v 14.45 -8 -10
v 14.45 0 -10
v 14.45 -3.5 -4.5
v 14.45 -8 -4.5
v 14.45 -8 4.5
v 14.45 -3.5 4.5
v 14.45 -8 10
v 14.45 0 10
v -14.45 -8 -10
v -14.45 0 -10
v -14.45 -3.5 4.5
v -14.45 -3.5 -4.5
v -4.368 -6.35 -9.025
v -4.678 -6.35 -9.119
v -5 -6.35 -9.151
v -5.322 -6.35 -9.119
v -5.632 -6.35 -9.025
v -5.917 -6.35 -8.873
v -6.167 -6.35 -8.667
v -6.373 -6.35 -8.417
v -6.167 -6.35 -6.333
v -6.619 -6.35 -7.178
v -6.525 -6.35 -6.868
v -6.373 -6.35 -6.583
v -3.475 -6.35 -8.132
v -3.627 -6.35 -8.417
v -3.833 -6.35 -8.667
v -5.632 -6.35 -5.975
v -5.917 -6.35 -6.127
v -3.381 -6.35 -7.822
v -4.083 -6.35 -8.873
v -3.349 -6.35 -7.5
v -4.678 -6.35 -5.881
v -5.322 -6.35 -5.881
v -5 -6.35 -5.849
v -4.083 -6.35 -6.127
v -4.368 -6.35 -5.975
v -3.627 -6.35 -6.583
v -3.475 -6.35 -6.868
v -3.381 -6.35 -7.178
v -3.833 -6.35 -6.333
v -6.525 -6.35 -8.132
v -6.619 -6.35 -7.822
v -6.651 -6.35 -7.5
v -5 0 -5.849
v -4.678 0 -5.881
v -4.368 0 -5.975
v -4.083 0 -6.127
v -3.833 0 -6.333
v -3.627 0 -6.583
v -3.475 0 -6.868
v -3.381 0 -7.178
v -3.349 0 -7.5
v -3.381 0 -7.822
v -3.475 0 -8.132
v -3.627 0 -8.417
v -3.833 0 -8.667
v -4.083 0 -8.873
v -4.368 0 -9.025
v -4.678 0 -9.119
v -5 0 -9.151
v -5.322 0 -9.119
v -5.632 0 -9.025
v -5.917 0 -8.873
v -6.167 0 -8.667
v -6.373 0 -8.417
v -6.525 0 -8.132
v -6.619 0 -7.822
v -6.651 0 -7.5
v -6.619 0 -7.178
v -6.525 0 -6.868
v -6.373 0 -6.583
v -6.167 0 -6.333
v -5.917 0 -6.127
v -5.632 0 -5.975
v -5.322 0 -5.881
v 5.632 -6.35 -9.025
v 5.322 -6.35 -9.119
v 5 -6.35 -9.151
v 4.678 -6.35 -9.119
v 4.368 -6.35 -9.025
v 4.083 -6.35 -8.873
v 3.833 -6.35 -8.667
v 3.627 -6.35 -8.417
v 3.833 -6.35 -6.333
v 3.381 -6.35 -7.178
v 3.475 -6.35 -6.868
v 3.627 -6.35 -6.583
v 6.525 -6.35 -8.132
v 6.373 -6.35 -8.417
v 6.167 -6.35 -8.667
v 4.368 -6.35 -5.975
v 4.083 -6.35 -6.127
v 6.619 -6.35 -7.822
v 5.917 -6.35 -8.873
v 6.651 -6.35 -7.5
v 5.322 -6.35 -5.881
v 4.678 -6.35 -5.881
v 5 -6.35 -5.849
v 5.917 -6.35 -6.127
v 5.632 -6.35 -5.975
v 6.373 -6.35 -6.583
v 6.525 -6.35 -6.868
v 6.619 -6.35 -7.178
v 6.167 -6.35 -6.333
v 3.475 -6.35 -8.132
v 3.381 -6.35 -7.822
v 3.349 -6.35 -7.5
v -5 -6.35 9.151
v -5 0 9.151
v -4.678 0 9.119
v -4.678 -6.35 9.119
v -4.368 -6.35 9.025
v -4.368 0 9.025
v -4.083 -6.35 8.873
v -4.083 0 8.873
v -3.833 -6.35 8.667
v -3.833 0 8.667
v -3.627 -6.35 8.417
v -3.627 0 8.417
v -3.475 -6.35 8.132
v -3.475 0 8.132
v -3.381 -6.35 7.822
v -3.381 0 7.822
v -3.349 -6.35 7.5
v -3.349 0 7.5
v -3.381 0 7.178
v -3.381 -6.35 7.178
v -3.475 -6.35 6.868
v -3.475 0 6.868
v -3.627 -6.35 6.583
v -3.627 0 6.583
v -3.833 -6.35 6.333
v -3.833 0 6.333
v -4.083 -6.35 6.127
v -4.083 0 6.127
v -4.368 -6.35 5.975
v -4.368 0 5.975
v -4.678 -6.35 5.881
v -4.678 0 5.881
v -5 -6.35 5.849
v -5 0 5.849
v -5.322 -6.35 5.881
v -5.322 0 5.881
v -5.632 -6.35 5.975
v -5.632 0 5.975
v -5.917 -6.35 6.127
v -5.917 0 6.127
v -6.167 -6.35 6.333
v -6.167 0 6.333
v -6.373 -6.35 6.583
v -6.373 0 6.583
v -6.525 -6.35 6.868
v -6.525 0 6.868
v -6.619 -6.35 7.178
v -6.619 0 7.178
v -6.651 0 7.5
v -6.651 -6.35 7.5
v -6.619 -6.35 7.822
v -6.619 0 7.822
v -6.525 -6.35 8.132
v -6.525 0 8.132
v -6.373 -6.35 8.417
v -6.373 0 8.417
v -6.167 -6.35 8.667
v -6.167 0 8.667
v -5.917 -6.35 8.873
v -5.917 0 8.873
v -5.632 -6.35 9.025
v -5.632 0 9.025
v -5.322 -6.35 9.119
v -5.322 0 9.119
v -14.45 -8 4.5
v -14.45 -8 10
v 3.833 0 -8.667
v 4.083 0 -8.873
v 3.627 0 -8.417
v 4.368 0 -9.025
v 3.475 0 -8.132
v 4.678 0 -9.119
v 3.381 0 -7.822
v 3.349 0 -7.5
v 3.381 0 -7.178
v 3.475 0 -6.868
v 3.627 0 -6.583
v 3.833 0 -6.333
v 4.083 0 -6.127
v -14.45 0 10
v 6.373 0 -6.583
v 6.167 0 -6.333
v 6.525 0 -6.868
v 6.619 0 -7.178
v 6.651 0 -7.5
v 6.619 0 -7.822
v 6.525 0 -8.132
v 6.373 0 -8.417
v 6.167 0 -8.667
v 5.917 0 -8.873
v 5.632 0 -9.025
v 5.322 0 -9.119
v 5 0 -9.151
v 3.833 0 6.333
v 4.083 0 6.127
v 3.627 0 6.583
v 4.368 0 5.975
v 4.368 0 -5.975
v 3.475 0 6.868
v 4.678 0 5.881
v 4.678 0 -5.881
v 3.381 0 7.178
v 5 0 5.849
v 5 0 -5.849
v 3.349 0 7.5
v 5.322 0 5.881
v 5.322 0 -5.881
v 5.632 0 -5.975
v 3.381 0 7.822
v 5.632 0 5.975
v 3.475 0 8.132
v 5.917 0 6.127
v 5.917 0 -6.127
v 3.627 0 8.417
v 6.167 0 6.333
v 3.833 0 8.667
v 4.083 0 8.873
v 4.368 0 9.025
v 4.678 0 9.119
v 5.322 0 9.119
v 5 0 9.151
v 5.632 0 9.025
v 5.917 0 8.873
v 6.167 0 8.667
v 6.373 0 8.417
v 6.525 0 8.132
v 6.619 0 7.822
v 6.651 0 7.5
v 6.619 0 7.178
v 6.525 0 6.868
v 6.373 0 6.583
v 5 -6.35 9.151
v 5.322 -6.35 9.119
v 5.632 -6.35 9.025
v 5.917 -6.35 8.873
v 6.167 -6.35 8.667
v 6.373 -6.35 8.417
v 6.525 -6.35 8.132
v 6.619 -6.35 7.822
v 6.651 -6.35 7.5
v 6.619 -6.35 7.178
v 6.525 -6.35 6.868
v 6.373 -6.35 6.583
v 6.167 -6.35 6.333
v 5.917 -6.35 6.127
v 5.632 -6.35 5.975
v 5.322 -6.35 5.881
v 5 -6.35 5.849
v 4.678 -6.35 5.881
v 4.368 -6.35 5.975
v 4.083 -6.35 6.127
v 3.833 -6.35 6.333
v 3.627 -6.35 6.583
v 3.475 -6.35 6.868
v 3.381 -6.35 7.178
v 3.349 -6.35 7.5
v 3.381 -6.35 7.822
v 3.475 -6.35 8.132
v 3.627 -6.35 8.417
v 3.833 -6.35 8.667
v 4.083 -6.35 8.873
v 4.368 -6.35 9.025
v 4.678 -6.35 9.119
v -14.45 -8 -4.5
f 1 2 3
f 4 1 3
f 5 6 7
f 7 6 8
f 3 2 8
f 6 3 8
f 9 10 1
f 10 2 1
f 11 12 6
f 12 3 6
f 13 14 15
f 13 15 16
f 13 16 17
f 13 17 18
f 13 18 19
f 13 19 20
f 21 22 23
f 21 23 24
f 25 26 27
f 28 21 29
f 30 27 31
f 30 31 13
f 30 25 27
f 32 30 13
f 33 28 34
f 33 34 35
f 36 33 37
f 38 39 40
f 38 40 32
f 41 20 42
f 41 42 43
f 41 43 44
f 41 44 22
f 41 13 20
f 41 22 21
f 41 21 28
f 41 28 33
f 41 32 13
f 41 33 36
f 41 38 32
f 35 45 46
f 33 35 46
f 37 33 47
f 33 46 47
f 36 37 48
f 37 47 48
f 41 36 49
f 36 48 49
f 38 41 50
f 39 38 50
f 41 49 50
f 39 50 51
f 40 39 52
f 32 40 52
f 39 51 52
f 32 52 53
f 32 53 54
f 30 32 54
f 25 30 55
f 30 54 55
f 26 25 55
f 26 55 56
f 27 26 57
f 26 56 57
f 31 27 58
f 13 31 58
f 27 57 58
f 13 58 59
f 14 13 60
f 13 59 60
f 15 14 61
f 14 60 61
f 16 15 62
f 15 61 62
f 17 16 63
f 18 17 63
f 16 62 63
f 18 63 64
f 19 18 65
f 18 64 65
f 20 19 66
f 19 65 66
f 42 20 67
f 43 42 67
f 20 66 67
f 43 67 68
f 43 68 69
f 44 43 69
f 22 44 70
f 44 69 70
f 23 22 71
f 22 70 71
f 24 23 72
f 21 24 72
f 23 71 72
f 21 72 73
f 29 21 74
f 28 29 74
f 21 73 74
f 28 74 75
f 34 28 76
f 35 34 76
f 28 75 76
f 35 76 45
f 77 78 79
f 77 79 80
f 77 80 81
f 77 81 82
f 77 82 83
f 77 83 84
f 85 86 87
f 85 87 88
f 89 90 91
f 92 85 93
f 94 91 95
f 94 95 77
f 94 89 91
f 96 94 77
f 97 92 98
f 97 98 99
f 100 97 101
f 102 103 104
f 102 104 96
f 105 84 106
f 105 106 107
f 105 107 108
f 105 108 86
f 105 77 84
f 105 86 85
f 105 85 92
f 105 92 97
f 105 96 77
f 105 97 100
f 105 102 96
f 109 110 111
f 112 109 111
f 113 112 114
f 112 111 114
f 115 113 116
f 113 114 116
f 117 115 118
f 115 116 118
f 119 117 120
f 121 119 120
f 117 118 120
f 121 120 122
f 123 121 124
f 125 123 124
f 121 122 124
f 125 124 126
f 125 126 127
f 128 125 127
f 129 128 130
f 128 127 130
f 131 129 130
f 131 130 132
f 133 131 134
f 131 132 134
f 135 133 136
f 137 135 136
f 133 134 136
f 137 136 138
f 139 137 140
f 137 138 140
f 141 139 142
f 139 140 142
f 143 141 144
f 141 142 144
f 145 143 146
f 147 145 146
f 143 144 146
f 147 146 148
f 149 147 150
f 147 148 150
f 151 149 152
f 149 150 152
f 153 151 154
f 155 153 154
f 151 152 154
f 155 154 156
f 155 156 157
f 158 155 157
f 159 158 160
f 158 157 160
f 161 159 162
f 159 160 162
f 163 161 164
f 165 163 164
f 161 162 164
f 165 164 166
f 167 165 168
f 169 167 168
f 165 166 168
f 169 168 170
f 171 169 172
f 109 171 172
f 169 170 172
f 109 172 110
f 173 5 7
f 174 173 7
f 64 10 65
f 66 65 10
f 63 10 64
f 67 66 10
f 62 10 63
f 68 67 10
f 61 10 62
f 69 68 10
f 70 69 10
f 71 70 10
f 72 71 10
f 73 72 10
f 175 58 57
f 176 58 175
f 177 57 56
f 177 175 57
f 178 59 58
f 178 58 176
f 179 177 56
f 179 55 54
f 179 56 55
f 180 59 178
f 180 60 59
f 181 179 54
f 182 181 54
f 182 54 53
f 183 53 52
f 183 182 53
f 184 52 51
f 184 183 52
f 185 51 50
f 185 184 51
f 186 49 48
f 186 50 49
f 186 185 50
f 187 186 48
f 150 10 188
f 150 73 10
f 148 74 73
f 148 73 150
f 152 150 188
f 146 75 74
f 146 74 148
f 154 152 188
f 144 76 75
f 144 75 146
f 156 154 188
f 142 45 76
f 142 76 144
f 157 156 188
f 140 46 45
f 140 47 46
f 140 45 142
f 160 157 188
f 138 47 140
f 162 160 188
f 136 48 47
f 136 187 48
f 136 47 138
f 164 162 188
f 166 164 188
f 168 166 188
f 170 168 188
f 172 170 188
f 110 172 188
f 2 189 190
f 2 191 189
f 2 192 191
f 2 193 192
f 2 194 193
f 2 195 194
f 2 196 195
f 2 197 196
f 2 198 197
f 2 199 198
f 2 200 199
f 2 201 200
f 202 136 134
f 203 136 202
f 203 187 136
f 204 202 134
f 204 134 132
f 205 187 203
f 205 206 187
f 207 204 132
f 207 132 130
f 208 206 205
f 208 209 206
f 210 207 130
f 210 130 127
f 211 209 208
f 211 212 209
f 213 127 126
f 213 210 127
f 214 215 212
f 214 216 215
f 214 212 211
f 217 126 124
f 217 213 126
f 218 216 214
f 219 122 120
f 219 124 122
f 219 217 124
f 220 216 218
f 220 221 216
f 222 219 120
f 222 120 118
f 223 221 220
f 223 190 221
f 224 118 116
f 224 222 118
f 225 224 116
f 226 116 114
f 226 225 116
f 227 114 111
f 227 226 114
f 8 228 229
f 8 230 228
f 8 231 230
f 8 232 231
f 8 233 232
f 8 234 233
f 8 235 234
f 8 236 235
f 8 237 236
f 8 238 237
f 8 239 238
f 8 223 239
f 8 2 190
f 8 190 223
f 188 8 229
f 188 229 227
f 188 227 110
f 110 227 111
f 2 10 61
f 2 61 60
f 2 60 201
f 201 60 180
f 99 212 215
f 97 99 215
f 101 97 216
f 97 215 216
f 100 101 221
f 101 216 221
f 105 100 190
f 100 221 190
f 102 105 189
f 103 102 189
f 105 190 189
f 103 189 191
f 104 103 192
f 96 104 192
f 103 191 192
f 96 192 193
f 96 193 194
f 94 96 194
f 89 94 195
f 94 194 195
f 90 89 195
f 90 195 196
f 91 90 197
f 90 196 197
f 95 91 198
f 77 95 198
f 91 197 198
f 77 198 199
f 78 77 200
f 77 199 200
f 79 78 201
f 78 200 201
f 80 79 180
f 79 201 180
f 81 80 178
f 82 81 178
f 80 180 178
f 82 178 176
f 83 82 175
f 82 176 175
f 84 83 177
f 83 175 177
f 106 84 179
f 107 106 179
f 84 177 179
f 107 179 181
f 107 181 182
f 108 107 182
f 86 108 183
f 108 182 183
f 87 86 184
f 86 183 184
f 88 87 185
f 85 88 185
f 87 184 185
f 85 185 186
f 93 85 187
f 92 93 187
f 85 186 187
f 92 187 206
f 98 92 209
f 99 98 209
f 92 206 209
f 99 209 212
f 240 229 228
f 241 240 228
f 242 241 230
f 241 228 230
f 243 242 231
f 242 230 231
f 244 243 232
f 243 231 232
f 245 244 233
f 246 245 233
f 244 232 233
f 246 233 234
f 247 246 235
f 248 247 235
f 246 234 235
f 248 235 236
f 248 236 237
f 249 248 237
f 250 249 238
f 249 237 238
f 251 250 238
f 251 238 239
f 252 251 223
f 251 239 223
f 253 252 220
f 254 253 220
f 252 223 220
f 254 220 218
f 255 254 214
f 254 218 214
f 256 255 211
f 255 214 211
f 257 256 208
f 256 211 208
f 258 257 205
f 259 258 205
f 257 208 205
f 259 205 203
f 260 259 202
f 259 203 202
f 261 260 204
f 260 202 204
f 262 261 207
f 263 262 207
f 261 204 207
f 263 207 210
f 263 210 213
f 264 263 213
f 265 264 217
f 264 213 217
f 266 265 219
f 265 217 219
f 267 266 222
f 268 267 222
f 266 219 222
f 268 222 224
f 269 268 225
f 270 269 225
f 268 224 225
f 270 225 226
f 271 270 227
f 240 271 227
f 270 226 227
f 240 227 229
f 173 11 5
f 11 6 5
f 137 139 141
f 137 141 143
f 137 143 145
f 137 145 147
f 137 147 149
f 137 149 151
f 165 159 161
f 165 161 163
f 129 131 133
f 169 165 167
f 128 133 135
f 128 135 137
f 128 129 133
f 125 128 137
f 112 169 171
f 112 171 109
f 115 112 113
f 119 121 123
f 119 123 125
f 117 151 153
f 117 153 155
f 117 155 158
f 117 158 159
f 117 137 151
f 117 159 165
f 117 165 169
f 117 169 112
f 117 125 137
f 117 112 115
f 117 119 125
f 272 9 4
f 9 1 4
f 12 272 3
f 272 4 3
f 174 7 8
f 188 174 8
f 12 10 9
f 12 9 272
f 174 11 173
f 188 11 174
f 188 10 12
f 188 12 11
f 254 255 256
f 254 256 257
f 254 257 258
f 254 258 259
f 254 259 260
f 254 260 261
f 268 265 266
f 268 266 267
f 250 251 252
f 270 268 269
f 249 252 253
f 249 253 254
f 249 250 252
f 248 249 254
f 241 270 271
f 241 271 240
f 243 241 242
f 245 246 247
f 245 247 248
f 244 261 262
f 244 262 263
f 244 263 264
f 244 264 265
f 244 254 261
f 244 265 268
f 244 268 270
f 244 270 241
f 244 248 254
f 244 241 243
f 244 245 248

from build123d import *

# Parameters (mm, degrees)
BOSS_EXTRUDE1_DEPTH = 14.45
SKETCH2_R           = 1.651
CUT_EXTRUDE1_DEPTH  = 6.35


with BuildPart() as part:
    # Sketch1 → Boss-Extrude1 (new, symmetric)
    with BuildSketch(Plane(origin=(0, 0, 0), x_dir=(0, 0, -1), z_dir=(1, 0, 0))):
        Polygon((0, 0), (10, 0), (10, -8), (4.5, -8), (4.5, -3.5), (-4.5, -3.5), (-4.5, -8), (-10, -8), (-10, 0), align=None)
    extrude(amount=BOSS_EXTRUDE1_DEPTH, both=True)

    # Sketch2 → Cut-Extrude1 (cut)
    with BuildSketch(Plane(origin=(0, 0, 0), x_dir=(1, 0, 0), z_dir=(0, 1, 0))):
        with Locations(Location((5, 7.5, 0), (0, 0, 270))):
            Circle(SKETCH2_R)
        with Locations(Location((5, -7.5, 0), (0, 0, 270))):
            Circle(SKETCH2_R)
        with Locations(Location((-5, -7.5, 0), (0, 0, 270))):
            Circle(SKETCH2_R)
        with Locations(Location((-5, 7.5, 0), (0, 0, 270))):
            Circle(SKETCH2_R)
    extrude(amount=-CUT_EXTRUDE1_DEPTH, mode=Mode.SUBTRACT)


solid = part.part
